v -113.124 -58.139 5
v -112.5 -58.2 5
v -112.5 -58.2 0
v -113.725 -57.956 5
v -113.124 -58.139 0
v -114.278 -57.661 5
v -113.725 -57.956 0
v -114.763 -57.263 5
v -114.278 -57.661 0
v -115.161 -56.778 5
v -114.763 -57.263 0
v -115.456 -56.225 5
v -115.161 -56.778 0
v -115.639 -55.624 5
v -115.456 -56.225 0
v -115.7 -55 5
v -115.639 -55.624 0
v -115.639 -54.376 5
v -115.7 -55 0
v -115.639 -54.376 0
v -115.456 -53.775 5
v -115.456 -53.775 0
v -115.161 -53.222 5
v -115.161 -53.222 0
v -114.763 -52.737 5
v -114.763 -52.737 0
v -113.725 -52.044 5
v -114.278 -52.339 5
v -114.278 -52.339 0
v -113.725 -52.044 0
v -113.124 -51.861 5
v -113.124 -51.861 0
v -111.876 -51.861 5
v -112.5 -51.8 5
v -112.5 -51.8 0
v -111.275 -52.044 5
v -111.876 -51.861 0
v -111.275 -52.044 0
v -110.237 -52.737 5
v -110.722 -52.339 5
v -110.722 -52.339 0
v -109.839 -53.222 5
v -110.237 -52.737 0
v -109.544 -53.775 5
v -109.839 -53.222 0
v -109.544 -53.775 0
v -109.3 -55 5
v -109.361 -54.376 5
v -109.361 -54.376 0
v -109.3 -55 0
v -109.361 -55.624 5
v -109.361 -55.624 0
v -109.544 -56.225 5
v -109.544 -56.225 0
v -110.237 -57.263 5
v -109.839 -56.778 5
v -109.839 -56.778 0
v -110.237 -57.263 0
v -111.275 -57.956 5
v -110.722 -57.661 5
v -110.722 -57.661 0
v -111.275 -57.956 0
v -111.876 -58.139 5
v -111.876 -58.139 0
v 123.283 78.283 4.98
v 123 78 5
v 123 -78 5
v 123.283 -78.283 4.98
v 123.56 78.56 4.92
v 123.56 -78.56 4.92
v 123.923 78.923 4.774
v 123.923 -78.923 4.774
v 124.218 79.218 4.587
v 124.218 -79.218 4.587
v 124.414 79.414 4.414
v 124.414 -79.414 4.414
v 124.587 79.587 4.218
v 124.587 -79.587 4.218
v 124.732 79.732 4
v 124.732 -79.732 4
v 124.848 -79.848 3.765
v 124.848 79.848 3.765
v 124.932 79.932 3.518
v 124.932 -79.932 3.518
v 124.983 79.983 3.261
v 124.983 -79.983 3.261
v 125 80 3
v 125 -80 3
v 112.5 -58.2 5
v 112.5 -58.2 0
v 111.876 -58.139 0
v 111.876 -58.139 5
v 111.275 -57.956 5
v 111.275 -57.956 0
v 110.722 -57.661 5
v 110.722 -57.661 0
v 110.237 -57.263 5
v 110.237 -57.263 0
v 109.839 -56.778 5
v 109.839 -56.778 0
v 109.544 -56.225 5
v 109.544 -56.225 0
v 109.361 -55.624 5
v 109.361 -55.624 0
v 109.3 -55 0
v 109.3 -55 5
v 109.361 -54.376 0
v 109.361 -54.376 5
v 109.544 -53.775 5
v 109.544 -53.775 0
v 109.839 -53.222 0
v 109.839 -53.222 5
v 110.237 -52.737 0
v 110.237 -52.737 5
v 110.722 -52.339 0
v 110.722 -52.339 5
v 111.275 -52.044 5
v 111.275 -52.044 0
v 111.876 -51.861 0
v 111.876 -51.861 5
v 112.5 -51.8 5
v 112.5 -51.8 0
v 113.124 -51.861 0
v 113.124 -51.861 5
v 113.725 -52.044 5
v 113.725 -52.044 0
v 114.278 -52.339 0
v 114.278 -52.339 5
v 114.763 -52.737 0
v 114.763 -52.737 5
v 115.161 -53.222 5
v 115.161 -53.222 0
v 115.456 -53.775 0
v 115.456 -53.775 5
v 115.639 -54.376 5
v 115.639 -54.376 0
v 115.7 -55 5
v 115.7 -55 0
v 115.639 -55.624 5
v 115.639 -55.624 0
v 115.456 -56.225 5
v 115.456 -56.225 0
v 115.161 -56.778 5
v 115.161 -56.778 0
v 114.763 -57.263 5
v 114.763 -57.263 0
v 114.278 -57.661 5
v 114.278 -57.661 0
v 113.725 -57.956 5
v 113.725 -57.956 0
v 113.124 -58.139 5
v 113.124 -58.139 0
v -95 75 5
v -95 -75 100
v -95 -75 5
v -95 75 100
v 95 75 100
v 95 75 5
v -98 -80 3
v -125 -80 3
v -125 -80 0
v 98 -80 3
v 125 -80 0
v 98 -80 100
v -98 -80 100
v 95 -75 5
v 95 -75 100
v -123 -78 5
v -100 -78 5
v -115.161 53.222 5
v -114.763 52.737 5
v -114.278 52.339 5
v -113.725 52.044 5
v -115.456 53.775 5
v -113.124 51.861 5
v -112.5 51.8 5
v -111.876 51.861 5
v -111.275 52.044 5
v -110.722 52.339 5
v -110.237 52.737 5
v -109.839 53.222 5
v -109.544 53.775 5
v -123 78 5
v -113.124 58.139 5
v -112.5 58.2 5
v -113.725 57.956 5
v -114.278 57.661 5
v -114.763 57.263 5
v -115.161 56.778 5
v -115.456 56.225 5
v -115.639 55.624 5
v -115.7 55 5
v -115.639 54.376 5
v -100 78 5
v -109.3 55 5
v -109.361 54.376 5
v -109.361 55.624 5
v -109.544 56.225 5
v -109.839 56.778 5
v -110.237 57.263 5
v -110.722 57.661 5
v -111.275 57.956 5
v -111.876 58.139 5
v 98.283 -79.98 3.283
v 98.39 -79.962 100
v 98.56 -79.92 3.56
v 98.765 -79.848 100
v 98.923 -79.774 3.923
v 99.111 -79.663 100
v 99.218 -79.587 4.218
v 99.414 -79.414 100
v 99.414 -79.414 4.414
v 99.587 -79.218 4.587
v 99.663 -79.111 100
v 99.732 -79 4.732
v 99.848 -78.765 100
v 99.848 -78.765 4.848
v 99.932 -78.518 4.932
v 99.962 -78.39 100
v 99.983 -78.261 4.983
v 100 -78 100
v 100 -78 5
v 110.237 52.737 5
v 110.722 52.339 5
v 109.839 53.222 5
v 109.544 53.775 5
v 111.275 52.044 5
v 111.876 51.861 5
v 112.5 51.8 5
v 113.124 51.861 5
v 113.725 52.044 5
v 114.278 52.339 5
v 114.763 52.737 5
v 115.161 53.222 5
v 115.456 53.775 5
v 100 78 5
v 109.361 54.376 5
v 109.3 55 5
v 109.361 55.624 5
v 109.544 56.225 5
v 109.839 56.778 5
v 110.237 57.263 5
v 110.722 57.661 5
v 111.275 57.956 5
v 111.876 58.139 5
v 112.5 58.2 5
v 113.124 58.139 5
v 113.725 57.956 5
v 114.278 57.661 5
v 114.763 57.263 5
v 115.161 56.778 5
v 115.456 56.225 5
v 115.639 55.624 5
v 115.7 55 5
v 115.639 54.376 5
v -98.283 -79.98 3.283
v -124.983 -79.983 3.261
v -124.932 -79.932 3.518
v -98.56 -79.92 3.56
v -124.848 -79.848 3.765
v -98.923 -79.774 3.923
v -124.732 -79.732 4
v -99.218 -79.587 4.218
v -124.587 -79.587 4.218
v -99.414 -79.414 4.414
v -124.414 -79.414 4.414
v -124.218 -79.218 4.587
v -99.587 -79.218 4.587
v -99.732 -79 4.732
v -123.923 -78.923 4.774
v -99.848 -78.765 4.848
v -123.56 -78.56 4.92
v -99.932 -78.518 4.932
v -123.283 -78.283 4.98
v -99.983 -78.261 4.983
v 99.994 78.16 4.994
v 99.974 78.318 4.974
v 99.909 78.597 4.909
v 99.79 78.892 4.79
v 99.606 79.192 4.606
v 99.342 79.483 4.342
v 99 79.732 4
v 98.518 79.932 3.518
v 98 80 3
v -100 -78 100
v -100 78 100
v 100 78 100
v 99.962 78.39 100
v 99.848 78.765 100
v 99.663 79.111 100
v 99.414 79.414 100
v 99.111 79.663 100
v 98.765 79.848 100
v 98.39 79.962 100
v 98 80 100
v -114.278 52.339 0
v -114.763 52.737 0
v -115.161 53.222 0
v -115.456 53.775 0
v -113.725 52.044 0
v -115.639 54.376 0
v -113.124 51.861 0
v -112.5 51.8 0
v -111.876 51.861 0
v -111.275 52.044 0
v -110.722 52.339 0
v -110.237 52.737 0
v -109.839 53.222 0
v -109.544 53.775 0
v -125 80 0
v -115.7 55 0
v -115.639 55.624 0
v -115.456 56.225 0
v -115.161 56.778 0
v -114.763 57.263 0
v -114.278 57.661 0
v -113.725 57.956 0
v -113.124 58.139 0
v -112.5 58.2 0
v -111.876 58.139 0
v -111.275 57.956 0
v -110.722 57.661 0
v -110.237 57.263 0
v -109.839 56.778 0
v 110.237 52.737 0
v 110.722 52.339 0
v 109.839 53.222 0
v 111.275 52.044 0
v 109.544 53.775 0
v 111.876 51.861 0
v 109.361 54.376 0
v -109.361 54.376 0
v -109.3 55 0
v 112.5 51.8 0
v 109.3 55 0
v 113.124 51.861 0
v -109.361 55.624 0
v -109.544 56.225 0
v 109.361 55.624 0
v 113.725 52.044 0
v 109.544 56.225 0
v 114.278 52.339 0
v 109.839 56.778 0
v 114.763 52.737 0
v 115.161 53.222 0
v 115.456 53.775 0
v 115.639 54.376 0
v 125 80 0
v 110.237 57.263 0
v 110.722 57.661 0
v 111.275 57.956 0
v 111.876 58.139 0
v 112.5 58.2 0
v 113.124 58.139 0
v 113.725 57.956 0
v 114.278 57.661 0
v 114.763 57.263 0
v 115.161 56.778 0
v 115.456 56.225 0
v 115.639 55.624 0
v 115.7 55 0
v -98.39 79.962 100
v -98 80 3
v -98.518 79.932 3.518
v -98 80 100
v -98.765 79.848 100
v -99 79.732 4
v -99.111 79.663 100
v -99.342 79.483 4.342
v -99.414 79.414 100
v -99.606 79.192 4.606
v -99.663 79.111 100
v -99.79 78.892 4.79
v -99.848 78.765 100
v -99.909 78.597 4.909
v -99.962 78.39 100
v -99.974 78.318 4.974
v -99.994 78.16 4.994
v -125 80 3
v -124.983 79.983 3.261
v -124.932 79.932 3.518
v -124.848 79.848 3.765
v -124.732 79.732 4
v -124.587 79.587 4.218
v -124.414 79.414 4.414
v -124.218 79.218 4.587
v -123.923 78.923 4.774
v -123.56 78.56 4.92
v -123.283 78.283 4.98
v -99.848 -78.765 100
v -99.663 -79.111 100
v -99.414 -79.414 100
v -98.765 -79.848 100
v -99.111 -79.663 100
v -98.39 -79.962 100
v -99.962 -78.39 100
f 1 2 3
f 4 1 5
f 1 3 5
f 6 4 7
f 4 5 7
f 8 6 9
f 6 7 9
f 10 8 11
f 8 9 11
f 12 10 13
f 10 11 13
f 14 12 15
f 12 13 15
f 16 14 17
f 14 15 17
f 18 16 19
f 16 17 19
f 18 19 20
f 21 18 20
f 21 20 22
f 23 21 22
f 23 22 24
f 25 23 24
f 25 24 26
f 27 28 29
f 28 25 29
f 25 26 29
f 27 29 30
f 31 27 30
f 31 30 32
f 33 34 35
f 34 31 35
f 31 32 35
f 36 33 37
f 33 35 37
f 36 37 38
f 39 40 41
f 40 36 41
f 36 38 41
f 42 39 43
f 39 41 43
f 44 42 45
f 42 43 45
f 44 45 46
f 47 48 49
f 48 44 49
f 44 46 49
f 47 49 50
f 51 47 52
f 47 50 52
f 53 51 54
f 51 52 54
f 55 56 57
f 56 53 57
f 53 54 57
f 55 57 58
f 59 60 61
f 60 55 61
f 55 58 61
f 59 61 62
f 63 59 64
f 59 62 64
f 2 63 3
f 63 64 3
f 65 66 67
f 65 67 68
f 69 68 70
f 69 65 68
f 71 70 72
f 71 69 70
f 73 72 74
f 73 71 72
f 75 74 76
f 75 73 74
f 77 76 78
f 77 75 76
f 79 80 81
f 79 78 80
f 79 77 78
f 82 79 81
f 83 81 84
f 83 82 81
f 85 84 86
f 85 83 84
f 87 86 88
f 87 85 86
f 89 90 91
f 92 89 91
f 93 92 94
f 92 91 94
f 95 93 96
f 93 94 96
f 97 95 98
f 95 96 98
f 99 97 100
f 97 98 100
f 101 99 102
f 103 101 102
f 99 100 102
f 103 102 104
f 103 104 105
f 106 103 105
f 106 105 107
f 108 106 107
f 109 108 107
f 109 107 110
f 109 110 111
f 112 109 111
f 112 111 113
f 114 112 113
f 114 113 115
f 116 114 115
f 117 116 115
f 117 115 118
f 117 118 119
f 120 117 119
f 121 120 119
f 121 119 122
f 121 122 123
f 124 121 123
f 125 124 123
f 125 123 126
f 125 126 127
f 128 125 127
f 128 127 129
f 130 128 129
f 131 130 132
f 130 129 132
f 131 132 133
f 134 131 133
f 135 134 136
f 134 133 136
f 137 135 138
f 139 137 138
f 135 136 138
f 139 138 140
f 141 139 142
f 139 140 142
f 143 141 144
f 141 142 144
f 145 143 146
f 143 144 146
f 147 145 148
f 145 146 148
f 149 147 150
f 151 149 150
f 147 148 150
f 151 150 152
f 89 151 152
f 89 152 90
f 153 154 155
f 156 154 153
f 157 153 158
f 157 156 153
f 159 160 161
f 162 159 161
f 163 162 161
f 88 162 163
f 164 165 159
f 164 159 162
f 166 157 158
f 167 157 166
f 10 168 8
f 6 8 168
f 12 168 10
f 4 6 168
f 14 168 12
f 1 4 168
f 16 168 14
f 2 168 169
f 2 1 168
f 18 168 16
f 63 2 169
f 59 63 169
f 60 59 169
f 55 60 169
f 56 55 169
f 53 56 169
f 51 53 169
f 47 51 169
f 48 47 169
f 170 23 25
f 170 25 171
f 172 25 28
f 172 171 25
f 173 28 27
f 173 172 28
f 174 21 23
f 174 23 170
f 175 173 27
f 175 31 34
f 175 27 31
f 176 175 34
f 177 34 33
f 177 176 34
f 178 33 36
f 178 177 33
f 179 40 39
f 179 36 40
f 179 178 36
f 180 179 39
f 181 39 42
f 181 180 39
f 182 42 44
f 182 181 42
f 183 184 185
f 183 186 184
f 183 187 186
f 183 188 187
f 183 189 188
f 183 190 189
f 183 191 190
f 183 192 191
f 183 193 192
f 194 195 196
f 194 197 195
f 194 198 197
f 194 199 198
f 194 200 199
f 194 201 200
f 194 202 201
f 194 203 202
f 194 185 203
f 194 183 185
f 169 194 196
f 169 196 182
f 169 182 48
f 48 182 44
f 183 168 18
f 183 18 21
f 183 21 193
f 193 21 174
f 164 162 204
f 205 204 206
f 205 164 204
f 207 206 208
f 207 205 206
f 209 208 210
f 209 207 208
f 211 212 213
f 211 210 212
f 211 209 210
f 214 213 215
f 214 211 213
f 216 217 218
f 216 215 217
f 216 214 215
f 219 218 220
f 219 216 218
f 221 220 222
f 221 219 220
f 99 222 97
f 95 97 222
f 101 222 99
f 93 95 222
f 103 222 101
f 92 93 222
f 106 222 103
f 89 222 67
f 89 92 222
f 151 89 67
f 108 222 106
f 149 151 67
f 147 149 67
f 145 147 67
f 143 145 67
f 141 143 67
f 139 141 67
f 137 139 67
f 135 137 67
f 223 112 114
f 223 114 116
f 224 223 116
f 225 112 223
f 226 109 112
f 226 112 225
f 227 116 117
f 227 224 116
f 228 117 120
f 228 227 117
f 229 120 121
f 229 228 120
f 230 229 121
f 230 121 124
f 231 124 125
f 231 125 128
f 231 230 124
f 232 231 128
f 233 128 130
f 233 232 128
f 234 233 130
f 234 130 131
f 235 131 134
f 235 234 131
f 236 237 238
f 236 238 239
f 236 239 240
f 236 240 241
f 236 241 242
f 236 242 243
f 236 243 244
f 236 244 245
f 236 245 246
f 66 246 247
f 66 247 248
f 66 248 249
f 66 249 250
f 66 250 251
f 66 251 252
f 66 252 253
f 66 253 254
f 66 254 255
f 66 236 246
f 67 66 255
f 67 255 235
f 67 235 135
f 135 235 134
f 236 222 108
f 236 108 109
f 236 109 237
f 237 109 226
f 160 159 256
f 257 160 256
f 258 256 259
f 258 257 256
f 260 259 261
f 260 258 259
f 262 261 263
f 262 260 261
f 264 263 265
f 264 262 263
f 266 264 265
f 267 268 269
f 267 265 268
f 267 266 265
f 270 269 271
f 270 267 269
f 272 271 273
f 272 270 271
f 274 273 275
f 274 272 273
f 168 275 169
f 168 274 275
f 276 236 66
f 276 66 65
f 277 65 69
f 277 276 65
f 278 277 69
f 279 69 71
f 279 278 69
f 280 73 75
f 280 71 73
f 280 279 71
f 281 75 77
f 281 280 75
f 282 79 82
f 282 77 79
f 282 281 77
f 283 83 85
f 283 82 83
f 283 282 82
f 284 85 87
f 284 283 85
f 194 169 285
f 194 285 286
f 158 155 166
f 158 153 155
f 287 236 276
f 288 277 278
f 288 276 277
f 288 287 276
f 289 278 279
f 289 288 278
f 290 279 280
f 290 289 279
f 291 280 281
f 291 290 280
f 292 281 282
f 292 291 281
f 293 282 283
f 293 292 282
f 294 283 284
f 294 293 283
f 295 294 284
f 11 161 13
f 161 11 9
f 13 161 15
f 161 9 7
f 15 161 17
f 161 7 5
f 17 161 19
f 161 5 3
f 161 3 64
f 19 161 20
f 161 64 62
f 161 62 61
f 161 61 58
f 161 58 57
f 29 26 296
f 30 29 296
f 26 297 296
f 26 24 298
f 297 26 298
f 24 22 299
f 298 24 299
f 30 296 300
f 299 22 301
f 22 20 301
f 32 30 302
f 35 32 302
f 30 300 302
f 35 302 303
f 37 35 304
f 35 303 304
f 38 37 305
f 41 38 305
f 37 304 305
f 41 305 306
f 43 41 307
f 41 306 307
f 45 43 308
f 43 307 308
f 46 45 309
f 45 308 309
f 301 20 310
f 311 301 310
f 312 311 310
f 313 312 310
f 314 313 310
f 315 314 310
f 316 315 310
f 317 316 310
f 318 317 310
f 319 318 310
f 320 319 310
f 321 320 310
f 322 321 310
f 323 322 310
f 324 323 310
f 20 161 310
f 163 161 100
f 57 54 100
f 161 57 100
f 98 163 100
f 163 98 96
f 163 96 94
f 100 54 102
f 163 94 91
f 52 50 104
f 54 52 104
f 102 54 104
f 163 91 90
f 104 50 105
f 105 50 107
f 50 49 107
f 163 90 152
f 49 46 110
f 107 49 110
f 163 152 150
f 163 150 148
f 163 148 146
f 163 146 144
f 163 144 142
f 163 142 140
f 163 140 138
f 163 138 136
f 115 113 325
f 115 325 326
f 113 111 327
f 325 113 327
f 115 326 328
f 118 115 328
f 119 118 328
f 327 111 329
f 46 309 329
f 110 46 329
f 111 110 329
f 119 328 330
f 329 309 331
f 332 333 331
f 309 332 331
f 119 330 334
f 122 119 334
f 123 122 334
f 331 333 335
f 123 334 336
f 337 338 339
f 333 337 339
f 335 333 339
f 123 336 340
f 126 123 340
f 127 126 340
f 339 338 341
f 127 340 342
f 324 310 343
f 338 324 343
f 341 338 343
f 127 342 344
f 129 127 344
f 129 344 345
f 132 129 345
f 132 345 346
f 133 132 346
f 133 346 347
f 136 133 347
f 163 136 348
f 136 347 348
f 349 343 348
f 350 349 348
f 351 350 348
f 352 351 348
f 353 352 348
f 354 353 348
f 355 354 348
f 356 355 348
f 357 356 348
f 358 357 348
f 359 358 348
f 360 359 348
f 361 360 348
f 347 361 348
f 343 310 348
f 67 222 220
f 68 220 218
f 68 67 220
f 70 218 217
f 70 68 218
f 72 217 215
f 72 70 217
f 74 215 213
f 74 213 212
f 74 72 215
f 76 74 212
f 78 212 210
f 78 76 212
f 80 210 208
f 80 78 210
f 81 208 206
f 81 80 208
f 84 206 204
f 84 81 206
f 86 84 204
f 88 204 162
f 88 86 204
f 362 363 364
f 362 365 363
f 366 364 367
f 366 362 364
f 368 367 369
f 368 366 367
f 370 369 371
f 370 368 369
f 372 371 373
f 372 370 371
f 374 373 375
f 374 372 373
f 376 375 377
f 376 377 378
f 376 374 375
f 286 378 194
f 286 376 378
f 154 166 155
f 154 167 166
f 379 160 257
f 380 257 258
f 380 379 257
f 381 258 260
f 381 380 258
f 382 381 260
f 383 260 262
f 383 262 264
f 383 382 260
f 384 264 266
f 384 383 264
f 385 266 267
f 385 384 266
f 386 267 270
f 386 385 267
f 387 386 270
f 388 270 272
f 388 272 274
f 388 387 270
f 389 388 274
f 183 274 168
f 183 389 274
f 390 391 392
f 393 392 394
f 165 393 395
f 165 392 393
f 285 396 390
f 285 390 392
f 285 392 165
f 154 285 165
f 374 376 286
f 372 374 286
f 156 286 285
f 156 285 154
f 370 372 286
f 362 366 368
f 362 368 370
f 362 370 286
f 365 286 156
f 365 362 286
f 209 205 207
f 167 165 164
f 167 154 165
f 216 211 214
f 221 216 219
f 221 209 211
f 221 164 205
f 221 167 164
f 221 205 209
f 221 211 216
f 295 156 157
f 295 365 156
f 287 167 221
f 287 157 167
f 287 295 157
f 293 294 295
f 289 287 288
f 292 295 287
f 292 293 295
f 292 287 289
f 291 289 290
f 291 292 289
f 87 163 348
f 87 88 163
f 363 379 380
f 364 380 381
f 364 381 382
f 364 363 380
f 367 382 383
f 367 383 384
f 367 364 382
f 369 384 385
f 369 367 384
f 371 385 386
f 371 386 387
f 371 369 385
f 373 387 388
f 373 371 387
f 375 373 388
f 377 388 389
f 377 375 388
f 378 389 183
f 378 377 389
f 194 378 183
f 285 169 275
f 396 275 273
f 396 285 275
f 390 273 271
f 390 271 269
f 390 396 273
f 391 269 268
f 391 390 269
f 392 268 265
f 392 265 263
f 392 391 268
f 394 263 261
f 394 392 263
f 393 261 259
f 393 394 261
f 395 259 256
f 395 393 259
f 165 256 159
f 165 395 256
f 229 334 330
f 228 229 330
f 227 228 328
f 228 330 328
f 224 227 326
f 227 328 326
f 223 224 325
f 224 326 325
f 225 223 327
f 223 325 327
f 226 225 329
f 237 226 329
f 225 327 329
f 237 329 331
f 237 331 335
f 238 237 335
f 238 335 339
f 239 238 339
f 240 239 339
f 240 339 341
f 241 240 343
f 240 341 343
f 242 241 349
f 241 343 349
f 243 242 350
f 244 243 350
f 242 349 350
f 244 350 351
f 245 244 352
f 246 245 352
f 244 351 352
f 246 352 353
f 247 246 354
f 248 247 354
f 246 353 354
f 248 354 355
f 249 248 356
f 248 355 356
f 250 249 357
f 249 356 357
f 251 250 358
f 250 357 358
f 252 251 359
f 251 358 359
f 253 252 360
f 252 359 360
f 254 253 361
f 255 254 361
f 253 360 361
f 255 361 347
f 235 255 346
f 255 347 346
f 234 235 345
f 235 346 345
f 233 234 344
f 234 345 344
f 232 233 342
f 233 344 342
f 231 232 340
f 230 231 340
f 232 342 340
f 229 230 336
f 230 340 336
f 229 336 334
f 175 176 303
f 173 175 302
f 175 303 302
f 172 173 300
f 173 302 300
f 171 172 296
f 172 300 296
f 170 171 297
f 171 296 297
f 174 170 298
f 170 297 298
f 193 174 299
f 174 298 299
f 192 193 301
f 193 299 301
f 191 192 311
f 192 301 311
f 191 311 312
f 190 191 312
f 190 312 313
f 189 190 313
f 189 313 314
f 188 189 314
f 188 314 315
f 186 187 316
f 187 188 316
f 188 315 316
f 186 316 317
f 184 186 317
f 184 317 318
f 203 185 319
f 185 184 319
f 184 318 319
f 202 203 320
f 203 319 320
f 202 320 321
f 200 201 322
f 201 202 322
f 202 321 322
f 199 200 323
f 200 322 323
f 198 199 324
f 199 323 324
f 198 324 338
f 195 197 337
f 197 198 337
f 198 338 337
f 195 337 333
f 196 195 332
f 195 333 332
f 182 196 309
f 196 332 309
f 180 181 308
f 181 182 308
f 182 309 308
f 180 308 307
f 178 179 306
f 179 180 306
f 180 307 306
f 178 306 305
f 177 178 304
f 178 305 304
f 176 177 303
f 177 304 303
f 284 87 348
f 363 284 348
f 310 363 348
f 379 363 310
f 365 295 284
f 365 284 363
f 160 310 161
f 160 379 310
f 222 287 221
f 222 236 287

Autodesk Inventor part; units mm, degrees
sketch "Skizze1" plane through (0, 0, 0) normal (0, 0, 1) x (1, 0, 0)
  line L0 (-100, 80) -> (100, 80)
  line L1 (100, 80) -> (100, -80)
  line L2 (100, -80) -> (-100, -80)
  line L3 (-100, -80) -> (-100, 80)
  line L4 (0, -112) -> (0, 112) projected
  line L5 (-140, 0) -> (140, 0) projected
  point P0 (0, 0)
  dimension "d0" = 160
  dimension "d1" = 200
extrude "Extrusion1" add sketch "Skizze1" along normal blind 100
sketch "Skizze2" plane through (0, 0, 100) normal (0, 0, 1) x (1, 0, 0)
  line L0 (-95, 75) -> (95, 75)
  line L1 (95, 75) -> (95, -75)
  line L2 (95, -75) -> (-95, -75)
  line L3 (-95, -75) -> (-95, 75)
  line L4 (0, -112) -> (0, 112) projected
  line L5 (-140, 0) -> (140, 0) projected
  point P0 (0, 0)
  dimension "d4" = 150
  dimension "d5" = 190
extrude "Extrusion2" cut sketch "Skizze2" against normal blind 95
sketch "Skizze3" plane through (0, 0, 5) normal (0, 0, 1) x (1, 0, 0)
  line L0 (100, -80) -> (100, 80) projected
  line L1 (100, -80) -> (125, -80)
  line L2 (125, -80) -> (125, 80)
  line L3 (125, 80) -> (100, 80)
  line L4 (100, 80) -> (100, -80)
  point P0 (0, 0)
extrude "Extrusion3" add sketch "Skizze3" against normal blind 5
sketch "Skizze4" plane through (0, 0, 5) normal (0, 0, 1) x (1, 0, 0)
  point P0 (0, 0)
sketch "Skizze5" plane through (0, 0, 5) normal (0, 0, 1) x (1, 0, 0)
  line L0 (100, -80) -> (100, 80) projected
  line L1 (100, -80) -> (125, -80) projected
  line L2 (125, -80) -> (125, 80) projected
  line L3 (125, 80) -> (100, 80) projected
  point P0 (0, 0)
  point P1 (112.5, 55)
  point P2 (112.5, -55)
hole "Bohrung2" at (112.5, 55, 5) at (112.5, -55, 5) direction (0, 0, -1) diameter 6.4 depth 8 tip angle 118
mirror "Spiegeln1" about plane through (0, 0, 0) normal (1, 0, 0) of "Extrusion3", "Bohrung2"
fillet "Rundung1" radius 2 10 edges at (125, 0, 5) (-125, 0, 5) (-112.5, -80, 5) (-100, -80, 52.5) (112.5, -80, 5) (100, -80, 52.5) (112.5, 80, 5) (-112.5, 80, 5) (-100, 80, 52.5) (100, 80, 52.5)
properties part number "Box"
